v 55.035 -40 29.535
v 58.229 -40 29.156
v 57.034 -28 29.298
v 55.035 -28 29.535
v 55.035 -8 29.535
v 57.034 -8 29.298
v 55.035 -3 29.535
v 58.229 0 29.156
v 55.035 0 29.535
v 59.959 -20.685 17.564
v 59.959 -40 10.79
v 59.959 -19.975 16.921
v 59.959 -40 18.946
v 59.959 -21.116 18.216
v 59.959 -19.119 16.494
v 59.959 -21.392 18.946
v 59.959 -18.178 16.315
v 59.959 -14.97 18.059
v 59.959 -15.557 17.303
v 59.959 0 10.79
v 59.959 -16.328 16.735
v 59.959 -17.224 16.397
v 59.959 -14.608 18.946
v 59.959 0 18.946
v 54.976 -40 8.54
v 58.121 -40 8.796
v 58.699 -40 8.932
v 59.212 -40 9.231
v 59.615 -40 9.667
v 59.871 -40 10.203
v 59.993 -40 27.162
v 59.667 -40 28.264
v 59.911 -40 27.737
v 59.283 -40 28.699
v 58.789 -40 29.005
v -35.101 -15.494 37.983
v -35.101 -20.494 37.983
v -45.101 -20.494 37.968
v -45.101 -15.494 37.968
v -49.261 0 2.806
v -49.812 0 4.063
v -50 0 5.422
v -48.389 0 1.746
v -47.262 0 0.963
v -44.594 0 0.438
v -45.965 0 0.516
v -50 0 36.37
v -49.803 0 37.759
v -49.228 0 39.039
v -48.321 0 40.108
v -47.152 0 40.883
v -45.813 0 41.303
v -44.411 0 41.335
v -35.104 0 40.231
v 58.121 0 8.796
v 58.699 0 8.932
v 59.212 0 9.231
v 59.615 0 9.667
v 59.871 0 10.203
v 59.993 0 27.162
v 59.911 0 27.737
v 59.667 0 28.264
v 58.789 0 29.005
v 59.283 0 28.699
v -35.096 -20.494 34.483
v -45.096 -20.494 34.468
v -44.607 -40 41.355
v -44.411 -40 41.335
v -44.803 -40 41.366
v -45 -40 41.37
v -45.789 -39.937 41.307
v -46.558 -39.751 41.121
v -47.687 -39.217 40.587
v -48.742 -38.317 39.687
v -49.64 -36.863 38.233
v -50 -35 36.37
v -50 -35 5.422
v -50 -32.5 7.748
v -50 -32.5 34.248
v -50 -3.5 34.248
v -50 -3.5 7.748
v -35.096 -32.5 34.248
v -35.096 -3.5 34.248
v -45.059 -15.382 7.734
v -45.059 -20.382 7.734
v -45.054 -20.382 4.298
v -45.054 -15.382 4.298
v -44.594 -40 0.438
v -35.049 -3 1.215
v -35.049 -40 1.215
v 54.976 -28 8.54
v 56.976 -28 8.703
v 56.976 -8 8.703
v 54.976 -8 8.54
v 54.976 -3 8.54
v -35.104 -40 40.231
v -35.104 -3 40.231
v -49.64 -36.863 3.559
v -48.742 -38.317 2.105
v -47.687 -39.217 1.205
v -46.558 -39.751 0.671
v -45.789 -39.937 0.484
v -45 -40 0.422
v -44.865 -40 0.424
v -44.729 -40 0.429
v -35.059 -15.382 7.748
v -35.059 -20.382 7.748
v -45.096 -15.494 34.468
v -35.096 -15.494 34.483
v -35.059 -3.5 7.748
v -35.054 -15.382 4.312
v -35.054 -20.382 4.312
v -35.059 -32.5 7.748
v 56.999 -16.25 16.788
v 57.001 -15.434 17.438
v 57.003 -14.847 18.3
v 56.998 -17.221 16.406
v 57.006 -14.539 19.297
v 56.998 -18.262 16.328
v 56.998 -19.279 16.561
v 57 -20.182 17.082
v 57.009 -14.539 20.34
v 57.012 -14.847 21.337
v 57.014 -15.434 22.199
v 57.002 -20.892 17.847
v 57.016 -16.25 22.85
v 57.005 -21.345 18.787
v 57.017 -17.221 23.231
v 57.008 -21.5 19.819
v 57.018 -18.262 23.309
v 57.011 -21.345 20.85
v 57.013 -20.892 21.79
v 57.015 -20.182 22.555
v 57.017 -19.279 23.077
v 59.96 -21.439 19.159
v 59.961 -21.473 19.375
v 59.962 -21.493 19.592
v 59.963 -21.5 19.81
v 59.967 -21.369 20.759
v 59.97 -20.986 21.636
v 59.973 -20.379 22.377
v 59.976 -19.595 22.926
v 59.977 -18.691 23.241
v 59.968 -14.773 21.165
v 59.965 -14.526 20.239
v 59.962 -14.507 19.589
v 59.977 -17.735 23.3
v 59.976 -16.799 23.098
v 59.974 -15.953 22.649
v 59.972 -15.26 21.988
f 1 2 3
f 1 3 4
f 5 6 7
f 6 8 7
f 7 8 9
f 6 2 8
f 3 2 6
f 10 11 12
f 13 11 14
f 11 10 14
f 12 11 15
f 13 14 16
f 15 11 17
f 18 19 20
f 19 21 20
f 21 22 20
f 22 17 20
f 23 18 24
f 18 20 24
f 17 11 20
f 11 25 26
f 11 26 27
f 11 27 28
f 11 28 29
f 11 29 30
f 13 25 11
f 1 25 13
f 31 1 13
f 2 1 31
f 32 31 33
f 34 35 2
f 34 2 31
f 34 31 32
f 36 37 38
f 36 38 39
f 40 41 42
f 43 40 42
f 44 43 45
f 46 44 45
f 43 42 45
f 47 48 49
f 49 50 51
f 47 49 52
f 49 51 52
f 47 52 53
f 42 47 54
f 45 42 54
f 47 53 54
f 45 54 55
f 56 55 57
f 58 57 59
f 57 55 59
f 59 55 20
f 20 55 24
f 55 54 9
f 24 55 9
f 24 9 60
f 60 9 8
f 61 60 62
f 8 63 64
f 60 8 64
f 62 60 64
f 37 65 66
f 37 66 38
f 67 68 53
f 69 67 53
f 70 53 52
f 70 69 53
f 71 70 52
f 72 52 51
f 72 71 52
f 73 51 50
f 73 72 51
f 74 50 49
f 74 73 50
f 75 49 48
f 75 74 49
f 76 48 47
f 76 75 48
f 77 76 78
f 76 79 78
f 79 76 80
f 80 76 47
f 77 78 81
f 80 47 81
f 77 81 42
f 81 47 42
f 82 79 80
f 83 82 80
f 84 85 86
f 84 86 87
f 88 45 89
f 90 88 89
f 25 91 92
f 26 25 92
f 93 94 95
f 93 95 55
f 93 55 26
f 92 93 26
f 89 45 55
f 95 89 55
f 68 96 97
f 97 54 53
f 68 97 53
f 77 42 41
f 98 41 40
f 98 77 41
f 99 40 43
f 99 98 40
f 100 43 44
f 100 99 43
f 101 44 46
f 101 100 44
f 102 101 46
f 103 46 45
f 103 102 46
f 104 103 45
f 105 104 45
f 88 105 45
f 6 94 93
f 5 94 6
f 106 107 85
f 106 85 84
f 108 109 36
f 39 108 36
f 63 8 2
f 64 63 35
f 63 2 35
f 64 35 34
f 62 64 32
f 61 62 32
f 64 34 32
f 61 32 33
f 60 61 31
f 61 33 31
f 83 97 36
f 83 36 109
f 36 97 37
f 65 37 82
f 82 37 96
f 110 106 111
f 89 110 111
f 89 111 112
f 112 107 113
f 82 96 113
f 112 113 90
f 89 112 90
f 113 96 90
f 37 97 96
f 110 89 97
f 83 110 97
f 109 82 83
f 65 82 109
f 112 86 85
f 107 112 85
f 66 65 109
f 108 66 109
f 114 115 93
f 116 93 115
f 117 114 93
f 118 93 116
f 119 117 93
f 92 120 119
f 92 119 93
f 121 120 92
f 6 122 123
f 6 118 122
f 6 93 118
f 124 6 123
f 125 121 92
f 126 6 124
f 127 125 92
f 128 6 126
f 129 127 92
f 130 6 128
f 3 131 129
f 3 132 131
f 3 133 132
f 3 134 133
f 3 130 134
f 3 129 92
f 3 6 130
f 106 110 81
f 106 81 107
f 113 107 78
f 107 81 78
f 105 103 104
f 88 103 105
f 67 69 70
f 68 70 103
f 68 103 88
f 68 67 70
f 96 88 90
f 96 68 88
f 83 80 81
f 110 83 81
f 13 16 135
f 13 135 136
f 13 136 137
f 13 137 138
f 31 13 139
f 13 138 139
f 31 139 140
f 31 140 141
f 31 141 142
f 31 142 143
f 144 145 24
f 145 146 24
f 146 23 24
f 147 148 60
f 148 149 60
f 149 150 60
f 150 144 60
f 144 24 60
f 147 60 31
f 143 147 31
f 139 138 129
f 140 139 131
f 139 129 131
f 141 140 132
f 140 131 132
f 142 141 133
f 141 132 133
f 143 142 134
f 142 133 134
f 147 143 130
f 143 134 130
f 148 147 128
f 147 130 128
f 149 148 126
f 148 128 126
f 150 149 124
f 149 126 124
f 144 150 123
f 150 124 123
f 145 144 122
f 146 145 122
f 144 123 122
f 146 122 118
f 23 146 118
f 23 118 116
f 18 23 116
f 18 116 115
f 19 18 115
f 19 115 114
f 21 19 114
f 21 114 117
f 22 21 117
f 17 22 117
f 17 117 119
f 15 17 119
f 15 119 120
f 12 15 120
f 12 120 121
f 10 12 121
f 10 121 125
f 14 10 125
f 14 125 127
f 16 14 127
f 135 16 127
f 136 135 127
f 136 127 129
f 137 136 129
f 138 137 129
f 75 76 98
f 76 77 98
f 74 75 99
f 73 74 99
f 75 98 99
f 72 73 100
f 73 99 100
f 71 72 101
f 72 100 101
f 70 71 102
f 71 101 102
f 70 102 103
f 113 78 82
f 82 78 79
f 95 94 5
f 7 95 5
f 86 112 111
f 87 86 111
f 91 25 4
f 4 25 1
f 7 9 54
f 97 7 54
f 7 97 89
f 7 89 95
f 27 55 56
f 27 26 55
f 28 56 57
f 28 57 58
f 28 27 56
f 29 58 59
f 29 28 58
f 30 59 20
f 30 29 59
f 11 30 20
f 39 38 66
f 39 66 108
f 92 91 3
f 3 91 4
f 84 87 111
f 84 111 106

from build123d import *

# Parameters (mm, degrees)
F1_DEPTH  = 40
F3_DEPTH  = 37
F5_DEPTH  = 25
F6_R      = 5
F7_R      = 2
F9_W      = 5
F9_H      = 3.5
F9_H_2    = 3.4365921294
F10_DEPTH = 10
F11_W     = 20
F11_H     = 20.9946793665
F12_DEPTH = 2
F13_R     = 3.5
F14_DEPTH = 25


with BuildPart() as f1:
    # F0 (on Front) → F1 (new body)
    with BuildSketch(Plane.XZ):
        Polygon((-35.1044990334, 40.2309528088), (-35.0494137004, 1.2149916954), (54.9756615806, 8.540398173), (55.0351284044, 29.5349933202), align=None)
        Polygon((-49.999999976, 41.9984515125), (-49.999999976, -0.0015484875), (-35.0494137004, 1.2149916954), (-35.1044990334, 40.2309528088), align=None)
        Polygon((55.0351284044, 29.5349933202), (54.9756615806, 8.540398173), (59.9591903392, 8.9459115673), (59.9591903392, 18.9459115673), (60.0002953853, 28.9458270857), align=None)
    extrude(amount=F1_DEPTH)

    # F2 (on face) → F3 (cut)
    with BuildSketch(Plane.XZ.offset(40)):
        Polygon((-35.1044990334, 40.2309528088), (-35.0494137004, 1.2149916954), (54.9756615806, 8.540398173), (55.0351284044, 29.5349933202), align=None)
    extrude(amount=-F3_DEPTH, mode=Mode.SUBTRACT)

    # F4 (on face) → F5 (cut)
    with BuildSketch(Plane(origin=(-49.999999976, 0, 0), x_dir=(0, -1, 0), z_dir=(-1, 0, 0))):
        Polygon((3.5, 34.2484515125), (3.5, 20.9984515125), (3.5, 7.7484515125), (32.5, 7.7484515125), (32.5, 34.2484515125), align=None)
    extrude(amount=-F5_DEPTH, mode=Mode.SUBTRACT)

    # F6
    f6_edges = [f1.edges().sort_by_distance(p)[0] for p in [
        (-50, -20, 41.998452),
        (-50, -20, -0.001548),
        (-50, -40, 20.998452),
    ]]
    fillet(f6_edges, radius=F6_R)

    # F7
    f7_edges = [f1.edges().sort_by_distance(p)[0] for p in [
        (60.000295, -20, 28.945827),
        (59.95919, -20, 8.945912),
    ]]
    fillet(f7_edges, radius=F7_R)

    # F9 (on face) → F10 (cut)
    with BuildSketch(Plane(origin=(-35.0476284314, 0, -0.0494825765), x_dir=(0, 1, 0), z_dir=(0.9999990033, 0, 0.0014118652))):
        with Locations((-17.9936658144, 36.2820627093)):
            Rectangle(F9_W, F9_H)
        with Locations((-17.8817171156, 6.0796457964)):
            Rectangle(F9_W, F9_H_2)
    extrude(amount=-F10_DEPTH, mode=Mode.SUBTRACT)

    # F11 (on face) → F12 (cut)
    with BuildSketch(Plane(origin=(54.9510301824, 0, -0.1556478324), x_dir=(0, -1, 0), z_dir=(-0.9999959885, 0, 0.0028324712))):
        with Locations((18, 19.1934205725)):
            Rectangle(F11_W, F11_H)
    extrude(amount=-F12_DEPTH, mode=Mode.SUBTRACT)

    # F13 (on face) → F14 (cut)
    with BuildSketch(Plane(origin=(56.9510221594, 0, -0.1613127747), x_dir=(0, -1, 0), z_dir=(-0.9999959885, 0, 0.0028324712))):
        with Locations((18, 19.9799891561)):
            Circle(F13_R)
    extrude(amount=-F14_DEPTH, mode=Mode.SUBTRACT)


solid = f1.part
